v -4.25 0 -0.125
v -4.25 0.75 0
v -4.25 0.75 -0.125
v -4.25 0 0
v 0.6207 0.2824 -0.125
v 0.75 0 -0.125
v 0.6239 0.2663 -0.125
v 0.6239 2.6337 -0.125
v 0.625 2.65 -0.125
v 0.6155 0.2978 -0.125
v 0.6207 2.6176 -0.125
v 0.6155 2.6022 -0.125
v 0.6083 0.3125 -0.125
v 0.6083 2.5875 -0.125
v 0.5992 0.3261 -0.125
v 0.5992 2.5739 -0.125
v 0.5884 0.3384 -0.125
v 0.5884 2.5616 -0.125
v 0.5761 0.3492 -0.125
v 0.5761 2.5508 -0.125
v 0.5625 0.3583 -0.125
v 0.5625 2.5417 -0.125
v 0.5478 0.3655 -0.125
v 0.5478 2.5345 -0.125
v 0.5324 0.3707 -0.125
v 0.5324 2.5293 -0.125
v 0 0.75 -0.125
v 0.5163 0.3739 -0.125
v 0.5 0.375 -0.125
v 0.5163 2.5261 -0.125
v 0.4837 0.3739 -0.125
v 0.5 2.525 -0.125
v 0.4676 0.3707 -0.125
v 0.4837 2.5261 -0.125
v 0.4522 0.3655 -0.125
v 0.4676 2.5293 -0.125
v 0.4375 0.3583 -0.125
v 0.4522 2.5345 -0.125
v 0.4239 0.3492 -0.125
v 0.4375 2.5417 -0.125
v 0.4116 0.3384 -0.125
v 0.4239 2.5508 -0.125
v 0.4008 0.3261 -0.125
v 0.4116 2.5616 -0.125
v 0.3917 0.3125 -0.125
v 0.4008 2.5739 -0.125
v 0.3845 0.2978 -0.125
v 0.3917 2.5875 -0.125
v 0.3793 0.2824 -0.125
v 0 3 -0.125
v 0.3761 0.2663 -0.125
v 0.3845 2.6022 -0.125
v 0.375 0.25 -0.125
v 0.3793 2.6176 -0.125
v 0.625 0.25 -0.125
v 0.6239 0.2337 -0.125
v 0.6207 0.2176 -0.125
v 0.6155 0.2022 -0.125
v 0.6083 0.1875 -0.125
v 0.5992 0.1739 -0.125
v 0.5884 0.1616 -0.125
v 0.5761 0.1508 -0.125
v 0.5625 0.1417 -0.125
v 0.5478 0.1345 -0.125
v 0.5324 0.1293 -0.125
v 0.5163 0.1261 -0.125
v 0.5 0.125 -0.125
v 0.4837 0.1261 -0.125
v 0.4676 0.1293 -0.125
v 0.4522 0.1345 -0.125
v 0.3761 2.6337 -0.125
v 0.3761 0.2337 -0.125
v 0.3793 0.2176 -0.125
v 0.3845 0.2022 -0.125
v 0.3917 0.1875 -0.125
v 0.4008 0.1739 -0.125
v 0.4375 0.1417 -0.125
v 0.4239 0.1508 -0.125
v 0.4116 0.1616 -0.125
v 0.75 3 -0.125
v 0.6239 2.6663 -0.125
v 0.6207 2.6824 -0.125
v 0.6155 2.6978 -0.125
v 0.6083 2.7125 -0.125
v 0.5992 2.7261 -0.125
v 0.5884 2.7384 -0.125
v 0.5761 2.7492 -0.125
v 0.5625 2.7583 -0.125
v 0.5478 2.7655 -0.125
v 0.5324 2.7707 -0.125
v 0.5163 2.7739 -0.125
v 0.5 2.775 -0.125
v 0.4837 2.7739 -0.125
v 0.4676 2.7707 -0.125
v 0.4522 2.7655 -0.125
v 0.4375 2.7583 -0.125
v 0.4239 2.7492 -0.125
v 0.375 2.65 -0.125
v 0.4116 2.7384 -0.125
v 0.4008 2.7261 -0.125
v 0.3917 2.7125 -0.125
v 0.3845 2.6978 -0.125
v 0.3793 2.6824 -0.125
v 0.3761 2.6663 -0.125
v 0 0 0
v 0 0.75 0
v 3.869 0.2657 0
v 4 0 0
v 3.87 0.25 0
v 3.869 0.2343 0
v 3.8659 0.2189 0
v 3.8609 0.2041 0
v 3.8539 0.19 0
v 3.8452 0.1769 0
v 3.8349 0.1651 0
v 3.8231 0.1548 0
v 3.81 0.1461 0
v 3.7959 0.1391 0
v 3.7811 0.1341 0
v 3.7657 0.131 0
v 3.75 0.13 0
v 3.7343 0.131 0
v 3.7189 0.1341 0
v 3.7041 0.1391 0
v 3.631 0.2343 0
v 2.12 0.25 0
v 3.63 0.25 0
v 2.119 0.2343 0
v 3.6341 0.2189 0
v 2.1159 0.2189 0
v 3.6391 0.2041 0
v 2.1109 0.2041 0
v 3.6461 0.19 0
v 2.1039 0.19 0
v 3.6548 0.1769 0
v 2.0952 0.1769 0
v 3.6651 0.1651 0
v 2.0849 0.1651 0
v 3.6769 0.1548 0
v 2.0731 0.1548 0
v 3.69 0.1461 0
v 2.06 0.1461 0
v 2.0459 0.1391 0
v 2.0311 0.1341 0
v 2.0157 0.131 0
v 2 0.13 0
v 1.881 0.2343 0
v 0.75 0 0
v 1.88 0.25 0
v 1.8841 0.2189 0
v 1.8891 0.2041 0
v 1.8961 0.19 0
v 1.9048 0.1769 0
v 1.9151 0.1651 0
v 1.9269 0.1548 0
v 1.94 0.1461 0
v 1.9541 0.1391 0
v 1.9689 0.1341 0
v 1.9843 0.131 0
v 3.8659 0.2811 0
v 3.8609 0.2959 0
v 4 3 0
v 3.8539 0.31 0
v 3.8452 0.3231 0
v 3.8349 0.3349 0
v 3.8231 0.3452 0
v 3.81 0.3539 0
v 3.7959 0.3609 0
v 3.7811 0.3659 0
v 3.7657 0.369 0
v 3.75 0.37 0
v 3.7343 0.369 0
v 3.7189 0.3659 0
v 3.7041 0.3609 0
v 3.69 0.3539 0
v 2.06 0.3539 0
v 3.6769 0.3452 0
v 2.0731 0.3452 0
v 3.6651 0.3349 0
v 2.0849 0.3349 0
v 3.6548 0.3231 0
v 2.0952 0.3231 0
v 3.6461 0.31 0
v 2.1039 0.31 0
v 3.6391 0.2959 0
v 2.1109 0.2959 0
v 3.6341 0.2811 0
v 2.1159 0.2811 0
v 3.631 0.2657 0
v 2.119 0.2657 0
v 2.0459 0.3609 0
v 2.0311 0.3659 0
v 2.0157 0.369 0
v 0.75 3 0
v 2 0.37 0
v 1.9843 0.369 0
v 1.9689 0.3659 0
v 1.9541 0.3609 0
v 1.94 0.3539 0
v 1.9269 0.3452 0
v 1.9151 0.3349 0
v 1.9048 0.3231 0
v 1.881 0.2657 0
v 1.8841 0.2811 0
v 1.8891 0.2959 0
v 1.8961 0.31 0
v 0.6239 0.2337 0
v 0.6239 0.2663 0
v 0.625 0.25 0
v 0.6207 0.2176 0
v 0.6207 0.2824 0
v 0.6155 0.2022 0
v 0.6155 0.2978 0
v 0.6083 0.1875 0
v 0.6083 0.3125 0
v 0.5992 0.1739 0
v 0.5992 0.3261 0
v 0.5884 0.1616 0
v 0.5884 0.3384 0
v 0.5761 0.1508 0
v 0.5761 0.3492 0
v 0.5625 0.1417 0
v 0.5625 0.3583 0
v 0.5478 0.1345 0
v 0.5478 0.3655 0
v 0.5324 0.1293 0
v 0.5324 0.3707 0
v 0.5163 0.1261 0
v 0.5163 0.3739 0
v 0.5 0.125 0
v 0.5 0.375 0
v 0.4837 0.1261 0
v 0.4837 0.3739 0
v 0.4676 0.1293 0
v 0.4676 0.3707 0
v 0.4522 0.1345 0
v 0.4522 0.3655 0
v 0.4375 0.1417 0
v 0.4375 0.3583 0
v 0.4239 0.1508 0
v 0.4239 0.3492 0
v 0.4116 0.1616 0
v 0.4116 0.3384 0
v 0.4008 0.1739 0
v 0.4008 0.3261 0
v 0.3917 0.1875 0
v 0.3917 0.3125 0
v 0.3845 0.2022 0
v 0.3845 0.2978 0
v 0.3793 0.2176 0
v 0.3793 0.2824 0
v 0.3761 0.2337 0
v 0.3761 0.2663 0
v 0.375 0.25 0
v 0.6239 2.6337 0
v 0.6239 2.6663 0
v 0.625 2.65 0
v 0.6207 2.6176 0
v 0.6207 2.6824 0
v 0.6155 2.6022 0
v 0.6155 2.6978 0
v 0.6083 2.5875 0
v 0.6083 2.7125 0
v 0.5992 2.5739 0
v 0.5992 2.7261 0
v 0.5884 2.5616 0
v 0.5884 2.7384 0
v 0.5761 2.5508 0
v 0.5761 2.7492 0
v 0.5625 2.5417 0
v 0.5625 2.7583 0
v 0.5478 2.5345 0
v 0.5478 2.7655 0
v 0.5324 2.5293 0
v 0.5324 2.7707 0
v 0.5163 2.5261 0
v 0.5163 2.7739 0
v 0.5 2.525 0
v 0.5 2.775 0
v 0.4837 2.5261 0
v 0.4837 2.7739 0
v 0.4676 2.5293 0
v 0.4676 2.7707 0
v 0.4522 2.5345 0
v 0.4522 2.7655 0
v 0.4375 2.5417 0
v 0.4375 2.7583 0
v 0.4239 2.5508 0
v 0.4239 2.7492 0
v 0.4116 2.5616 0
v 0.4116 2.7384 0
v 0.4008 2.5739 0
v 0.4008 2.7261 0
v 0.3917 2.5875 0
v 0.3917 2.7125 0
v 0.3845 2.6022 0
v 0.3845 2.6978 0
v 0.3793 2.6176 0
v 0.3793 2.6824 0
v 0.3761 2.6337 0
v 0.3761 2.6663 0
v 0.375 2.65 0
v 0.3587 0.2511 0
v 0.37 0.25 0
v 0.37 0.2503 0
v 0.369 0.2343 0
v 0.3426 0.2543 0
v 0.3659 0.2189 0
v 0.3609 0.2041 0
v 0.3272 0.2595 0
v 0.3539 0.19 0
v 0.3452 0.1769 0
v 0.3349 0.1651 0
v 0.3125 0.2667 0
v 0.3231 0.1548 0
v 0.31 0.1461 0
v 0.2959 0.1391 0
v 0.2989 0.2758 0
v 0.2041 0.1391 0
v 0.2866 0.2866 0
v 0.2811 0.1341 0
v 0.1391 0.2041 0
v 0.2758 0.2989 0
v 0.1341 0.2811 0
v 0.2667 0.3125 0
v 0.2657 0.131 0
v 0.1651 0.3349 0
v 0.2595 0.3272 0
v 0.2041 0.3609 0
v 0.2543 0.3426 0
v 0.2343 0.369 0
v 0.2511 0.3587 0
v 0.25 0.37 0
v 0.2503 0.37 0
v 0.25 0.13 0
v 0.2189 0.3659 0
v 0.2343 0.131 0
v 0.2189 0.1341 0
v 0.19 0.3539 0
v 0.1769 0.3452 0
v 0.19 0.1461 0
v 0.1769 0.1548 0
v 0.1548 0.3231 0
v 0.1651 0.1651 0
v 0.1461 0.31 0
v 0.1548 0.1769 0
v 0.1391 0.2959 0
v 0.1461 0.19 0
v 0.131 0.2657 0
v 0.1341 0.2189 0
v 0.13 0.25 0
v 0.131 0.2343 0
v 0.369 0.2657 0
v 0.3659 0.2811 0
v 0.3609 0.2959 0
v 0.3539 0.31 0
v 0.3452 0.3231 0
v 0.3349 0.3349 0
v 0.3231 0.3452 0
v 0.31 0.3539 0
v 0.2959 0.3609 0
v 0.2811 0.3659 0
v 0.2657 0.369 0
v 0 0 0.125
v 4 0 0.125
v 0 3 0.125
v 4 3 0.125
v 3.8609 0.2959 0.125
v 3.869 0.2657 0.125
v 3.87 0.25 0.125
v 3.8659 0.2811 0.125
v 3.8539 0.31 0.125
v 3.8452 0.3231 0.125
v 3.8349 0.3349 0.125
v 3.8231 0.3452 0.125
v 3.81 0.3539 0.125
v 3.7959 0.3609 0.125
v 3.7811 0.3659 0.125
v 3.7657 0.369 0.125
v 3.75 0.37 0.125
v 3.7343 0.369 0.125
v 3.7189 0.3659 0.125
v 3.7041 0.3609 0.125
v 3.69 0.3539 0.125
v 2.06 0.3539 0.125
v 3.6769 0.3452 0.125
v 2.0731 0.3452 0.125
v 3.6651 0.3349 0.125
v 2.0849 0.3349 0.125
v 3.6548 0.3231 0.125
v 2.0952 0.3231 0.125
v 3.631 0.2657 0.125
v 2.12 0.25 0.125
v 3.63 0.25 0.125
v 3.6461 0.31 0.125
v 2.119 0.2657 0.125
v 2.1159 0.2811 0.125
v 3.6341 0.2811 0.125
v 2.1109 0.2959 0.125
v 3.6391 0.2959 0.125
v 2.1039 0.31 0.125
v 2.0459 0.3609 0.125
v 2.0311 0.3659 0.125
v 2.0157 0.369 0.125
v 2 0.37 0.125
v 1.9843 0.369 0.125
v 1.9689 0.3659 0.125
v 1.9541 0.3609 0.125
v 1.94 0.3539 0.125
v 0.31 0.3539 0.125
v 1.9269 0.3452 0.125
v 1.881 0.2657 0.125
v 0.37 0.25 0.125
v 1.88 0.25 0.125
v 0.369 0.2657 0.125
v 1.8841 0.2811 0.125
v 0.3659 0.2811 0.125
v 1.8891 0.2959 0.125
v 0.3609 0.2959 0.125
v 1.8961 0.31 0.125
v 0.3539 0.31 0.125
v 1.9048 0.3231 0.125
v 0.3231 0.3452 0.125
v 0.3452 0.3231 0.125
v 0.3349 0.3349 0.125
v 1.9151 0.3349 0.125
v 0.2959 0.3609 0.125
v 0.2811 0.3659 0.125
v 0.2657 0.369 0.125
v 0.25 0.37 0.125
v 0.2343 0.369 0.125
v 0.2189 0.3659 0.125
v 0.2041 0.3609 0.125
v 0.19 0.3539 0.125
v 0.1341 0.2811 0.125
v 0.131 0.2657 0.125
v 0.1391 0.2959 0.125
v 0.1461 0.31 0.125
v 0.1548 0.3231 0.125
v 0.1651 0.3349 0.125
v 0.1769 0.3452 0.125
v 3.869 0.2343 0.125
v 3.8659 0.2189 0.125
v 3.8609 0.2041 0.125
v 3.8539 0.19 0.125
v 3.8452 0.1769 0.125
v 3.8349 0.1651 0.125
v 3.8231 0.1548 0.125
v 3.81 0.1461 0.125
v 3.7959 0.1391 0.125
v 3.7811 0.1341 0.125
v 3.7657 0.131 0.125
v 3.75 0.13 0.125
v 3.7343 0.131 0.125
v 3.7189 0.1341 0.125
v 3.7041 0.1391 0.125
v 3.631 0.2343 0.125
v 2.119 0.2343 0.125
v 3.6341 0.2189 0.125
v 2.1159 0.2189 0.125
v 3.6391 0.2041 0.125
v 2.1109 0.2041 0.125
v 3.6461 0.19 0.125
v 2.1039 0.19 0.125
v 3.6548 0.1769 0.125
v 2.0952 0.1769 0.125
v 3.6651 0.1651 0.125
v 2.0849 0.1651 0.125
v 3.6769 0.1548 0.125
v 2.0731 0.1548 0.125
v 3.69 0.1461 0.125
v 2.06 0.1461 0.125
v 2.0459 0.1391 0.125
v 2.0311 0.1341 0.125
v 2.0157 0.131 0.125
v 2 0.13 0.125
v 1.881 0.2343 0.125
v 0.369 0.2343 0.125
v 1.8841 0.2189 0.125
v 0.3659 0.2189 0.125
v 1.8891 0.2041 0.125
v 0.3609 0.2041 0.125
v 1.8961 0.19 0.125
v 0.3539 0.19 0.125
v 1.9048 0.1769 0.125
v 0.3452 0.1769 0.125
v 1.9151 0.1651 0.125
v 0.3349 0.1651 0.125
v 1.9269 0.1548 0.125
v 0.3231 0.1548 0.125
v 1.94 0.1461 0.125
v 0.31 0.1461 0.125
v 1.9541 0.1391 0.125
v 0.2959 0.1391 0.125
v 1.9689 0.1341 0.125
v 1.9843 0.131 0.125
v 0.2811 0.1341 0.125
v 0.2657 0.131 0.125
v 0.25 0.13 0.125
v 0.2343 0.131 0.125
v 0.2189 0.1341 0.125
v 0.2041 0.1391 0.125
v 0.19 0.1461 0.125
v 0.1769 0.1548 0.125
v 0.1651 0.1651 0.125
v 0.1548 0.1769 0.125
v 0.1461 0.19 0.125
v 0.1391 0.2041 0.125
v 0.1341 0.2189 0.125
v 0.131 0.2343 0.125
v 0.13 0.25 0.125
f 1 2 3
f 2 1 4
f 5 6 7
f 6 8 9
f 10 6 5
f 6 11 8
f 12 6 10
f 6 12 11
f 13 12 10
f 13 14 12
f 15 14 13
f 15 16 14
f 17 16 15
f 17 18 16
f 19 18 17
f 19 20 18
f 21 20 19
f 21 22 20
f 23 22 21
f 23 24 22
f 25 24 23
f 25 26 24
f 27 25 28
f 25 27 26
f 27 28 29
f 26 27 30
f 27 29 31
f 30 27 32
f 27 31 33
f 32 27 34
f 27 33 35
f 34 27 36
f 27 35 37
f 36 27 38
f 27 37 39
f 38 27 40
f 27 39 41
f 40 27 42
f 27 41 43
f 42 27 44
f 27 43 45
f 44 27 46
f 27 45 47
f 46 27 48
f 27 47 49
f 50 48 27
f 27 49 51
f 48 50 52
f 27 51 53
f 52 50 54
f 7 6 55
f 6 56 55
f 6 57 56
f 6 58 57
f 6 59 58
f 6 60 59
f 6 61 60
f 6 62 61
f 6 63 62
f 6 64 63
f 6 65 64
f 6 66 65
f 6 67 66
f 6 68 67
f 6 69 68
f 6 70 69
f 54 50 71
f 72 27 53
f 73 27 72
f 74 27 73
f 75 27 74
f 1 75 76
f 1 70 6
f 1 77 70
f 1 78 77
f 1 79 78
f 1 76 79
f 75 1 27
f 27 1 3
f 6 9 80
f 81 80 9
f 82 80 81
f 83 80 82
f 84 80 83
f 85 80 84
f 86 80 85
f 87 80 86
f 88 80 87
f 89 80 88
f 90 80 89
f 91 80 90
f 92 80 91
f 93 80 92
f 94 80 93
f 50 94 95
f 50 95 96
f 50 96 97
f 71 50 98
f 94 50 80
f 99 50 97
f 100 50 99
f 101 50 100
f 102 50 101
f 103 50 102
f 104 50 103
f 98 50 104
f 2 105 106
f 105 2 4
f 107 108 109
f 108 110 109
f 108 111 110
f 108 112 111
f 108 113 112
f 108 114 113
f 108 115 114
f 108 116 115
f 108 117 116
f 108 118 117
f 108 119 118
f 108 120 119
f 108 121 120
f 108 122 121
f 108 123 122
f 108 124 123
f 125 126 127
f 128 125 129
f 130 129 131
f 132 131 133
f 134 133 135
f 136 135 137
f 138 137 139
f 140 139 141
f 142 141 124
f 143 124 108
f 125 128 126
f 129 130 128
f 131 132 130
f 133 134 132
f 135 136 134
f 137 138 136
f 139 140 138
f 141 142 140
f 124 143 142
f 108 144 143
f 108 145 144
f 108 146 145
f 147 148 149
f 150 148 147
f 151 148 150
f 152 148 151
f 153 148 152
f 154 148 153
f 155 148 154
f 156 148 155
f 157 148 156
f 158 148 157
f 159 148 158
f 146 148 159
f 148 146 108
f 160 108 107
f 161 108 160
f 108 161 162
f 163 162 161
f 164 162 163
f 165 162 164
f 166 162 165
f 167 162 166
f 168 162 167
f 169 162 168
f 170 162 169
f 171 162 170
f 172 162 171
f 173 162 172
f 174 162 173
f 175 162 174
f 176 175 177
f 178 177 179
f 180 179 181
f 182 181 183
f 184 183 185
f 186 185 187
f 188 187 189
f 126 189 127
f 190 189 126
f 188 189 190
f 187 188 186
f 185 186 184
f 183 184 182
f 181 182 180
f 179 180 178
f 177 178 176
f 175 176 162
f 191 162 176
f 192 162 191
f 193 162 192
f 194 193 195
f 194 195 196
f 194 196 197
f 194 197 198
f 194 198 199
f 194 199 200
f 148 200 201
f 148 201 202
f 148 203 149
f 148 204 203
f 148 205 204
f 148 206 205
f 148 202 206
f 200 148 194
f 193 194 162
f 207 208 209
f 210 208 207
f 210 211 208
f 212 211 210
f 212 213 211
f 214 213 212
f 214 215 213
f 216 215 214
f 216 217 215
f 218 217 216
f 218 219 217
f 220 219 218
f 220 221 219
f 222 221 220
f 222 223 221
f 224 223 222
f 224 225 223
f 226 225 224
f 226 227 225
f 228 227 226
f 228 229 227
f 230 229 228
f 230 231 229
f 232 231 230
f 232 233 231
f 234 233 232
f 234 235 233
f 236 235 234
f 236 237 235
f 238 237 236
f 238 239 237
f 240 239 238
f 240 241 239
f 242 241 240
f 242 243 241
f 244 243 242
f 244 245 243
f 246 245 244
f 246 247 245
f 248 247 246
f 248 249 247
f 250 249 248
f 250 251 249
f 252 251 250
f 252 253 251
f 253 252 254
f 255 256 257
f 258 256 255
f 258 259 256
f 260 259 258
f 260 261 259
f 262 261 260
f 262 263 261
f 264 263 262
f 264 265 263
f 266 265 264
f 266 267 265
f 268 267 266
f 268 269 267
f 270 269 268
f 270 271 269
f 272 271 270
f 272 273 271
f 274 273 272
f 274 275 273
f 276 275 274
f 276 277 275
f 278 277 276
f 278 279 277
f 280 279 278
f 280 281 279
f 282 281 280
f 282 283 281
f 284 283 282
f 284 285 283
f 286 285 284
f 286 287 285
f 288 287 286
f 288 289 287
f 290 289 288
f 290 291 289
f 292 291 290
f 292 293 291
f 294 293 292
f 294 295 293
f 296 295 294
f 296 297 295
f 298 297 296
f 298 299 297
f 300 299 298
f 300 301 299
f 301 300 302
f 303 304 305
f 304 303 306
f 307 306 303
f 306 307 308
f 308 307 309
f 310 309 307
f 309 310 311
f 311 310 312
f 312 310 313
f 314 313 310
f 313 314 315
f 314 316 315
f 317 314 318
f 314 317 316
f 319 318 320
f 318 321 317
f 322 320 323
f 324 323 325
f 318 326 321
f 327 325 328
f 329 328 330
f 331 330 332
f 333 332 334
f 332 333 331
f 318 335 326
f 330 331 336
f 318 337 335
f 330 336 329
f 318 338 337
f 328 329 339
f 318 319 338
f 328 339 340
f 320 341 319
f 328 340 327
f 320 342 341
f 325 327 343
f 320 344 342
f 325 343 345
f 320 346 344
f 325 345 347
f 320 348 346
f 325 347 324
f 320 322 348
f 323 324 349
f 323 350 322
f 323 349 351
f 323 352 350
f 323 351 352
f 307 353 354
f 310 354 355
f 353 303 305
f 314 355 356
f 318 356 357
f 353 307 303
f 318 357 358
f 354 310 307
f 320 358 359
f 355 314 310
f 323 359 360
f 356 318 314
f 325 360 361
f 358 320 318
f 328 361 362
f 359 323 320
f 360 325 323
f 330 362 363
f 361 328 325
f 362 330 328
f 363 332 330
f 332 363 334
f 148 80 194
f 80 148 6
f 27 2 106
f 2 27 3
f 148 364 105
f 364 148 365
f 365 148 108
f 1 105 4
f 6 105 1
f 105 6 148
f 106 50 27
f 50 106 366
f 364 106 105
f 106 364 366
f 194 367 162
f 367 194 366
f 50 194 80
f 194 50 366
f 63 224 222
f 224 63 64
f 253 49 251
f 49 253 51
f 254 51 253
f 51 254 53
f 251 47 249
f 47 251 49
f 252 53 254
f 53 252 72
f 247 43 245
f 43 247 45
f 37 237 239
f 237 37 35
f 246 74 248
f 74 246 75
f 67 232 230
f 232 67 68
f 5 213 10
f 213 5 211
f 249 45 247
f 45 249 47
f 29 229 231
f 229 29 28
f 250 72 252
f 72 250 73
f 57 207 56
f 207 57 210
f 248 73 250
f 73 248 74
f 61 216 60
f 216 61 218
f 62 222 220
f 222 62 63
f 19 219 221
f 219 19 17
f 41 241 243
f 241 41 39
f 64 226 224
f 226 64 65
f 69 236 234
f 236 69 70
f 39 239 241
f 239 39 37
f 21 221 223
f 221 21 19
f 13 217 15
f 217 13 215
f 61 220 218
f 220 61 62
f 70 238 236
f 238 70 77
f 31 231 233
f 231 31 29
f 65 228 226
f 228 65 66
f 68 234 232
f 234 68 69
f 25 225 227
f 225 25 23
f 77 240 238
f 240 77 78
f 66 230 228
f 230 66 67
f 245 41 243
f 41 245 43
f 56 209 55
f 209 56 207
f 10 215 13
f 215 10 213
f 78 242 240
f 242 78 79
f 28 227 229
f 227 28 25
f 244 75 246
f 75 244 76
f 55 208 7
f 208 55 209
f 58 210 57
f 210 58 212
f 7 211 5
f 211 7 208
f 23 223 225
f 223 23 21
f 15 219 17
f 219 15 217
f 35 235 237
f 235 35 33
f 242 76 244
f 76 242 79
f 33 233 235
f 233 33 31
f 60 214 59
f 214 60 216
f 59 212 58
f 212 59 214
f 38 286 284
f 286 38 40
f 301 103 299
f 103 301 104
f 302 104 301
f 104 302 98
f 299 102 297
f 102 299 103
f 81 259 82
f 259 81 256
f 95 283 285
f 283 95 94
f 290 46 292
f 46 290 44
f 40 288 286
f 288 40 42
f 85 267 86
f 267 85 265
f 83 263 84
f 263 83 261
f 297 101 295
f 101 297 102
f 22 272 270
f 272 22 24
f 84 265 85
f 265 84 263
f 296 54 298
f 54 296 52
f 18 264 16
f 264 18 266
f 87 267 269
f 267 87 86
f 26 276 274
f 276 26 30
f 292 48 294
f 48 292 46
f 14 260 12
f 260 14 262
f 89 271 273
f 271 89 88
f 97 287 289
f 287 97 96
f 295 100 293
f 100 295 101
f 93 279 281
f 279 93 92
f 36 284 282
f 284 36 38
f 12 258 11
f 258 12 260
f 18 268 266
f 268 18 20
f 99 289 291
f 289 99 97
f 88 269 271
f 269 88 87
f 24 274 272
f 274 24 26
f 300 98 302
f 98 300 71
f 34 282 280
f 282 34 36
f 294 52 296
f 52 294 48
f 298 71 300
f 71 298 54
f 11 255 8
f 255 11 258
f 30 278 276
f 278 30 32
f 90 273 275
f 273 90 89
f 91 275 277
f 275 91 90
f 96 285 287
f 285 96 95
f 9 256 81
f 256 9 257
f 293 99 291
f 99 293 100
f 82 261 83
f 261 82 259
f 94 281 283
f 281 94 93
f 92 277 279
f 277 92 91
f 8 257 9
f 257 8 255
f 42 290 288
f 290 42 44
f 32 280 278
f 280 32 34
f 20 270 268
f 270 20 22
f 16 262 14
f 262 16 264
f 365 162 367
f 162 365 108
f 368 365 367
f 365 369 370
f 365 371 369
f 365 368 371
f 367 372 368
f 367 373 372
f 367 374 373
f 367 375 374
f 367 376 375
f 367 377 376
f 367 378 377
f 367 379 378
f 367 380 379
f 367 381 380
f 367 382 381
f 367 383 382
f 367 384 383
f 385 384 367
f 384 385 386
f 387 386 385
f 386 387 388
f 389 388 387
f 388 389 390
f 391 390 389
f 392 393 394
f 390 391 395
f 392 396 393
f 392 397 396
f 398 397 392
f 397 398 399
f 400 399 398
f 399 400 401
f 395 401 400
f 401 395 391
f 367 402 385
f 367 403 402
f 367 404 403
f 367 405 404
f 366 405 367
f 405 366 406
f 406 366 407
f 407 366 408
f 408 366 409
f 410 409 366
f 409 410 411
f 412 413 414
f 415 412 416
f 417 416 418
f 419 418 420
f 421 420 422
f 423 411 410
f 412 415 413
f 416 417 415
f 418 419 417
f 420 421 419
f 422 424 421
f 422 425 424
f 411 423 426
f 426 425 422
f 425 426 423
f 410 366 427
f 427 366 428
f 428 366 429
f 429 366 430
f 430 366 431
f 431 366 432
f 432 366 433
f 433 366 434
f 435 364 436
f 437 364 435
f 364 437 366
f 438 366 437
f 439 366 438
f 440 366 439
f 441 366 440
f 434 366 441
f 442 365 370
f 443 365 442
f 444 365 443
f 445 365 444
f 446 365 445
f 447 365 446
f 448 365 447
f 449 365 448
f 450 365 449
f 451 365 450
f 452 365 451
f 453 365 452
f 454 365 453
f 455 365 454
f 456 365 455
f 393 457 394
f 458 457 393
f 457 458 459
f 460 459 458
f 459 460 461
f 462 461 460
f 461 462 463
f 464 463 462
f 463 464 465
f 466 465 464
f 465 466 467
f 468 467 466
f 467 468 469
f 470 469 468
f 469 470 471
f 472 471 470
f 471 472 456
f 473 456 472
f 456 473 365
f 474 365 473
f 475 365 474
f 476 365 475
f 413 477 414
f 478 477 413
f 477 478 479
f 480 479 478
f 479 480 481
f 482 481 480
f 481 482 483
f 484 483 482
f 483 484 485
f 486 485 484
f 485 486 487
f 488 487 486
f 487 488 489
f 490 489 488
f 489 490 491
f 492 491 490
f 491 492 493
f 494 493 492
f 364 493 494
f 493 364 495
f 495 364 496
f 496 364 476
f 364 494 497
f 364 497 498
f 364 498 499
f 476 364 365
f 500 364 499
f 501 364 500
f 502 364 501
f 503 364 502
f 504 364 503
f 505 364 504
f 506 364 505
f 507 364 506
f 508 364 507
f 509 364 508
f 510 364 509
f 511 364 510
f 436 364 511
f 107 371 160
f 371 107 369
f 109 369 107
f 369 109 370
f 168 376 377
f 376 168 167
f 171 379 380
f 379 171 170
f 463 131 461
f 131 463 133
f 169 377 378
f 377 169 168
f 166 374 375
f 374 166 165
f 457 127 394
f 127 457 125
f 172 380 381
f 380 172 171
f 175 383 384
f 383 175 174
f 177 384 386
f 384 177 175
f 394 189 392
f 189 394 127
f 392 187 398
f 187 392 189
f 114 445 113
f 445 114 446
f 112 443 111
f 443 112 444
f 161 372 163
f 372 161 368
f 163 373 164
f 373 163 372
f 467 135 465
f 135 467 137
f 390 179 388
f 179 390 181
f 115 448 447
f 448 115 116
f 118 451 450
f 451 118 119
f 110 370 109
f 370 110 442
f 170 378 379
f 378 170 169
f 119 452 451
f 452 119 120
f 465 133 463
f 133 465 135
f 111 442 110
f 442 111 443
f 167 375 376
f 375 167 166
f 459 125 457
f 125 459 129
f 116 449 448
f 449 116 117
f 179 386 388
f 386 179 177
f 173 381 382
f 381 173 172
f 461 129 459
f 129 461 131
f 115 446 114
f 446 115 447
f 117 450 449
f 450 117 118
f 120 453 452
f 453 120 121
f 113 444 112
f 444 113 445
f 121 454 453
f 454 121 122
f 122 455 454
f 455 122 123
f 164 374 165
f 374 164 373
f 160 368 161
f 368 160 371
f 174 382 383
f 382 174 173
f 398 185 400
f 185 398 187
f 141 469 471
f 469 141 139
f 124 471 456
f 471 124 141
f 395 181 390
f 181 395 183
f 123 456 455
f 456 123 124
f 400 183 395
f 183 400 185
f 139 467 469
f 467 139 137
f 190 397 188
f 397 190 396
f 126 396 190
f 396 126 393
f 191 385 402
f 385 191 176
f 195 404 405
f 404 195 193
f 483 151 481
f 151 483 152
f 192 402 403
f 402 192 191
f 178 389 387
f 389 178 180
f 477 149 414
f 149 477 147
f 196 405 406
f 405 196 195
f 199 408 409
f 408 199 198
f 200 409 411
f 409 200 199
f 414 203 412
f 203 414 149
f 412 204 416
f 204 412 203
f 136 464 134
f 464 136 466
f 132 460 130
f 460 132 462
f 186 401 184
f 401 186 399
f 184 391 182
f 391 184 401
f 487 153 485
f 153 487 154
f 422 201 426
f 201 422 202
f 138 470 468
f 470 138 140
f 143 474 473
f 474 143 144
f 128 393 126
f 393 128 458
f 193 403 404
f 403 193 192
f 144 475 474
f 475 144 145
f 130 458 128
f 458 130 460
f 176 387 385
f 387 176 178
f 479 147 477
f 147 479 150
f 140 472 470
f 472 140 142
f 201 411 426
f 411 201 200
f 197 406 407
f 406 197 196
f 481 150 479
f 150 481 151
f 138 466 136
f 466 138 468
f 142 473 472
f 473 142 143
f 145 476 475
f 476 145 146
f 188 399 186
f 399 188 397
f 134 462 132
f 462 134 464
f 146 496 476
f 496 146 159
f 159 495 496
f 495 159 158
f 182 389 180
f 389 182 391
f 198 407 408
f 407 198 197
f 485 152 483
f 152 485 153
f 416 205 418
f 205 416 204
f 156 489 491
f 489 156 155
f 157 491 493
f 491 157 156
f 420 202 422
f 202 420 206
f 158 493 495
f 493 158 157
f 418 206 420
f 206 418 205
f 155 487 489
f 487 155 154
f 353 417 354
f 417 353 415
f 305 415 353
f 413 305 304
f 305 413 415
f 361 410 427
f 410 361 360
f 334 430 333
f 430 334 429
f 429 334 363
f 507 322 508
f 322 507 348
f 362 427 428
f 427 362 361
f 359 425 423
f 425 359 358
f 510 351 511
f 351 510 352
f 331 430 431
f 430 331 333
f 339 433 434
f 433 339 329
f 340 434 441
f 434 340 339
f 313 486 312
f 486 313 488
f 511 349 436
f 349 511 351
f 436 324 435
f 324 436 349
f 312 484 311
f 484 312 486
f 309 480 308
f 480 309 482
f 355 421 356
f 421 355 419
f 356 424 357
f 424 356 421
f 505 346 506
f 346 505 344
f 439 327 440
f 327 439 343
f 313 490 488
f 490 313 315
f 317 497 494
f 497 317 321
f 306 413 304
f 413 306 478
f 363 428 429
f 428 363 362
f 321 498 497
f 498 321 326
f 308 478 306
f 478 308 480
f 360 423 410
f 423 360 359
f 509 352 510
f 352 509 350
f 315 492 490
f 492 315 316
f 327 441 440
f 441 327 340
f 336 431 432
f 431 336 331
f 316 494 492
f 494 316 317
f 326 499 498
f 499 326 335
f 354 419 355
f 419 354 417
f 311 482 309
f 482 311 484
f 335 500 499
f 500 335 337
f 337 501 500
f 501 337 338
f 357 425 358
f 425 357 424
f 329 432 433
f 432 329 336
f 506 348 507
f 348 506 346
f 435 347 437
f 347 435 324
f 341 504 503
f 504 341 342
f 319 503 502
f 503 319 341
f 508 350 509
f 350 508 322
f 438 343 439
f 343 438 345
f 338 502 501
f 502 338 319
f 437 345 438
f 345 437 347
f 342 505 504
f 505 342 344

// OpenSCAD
$fn = 48;
arc_radius=3;
union() {
	union() {
		difference() {
			rotate(a = [0, 180, 0]) {
				difference() {
                    color("blue") {
                        translate([-.75,0,0]) {
                            union() {
                                cube(size = [5, 0.7500000000, 0.1250000000]);
                                cube(size = [0.7500000000, 3, 0.1250000000]);
                            }
                        }
                    }
                    // holes
					translate(v = [-0.500000000, 0.2500000000, 0]) {
						cylinder(h = 0.1250000000, r = 0.1250000000);
					}
					translate(v = [-0.500000000, 2.6500000000, 0]) {
						cylinder(h = 0.1250000000, r = 0.1250000000);
					}
				}
			}
			translate(v = [0.3750000000, 0.3750000000, 0]) {
				cylinder(h = 0.1250000000, r = 0.1250000000);
			}
			translate(v = [0.3750000000, 2.6250000000, 0]) {
				cylinder(h = 0.1250000000, r = 0.1250000000);
			}
			translate(v = [5.6255000000, 0.3750000000, 0]) {
				cylinder(h = 0.1250000000, r = 0.1250000000);
			}
		}
        //the arc
		difference() {
			cube(size = [4, 3, 0.1250000000]);
			translate(v = [3.7500000000, 0.2500000000]) {
				cylinder(h = 0.2500000000, r = 0.1200000000);
			}
			translate(v = [2, 0.2500000000]) {
				cylinder(h = 0.2500000000, r = 0.1200000000);
			}
			translate(v = [0.2500000000, 0.2500000000]) {
				cylinder(h = 0.2500000000, r = 0.1200000000);
			}
			difference() {
				difference() {
					circle(r = 2.7500000000);
					rotate(a = 5) {
						translate(v = [0, -2.7500000000, 0]) {
							square(center = true, size = [8.2500000000, 5.5000000000]);
						}
					}
					rotate(a = -95) {
						translate(v = [0, -2.7500000000, 0]) {
							square(center = true, size = [8.2500000000, 5.5000000000]);
						}
					}
				}
				difference() {
					circle(r = 2.6250000000);
					rotate(a = 5) {
						translate(v = [0, -2.6250000000, 0]) {
							square(center = true, size = [7.8750000000, 5.2500000000]);
						}
					}
					rotate(a = -95) {
						translate(v = [0, -2.6250000000, 0]) {
							square(center = true, size = [7.8750000000, 5.2500000000]);
						}
					}
				}
			}
		}
	}
}
/***********************************************
*********      SolidPython code:      **********
************************************************
 
#! /usr/bin/env python
# -*- coding: UTF-8 -*-
from __future__ import division
import os
import sys
import re

# Assumes SolidPython is in site-packages or elsewhwere in sys.path
from solid import *
from solid.utils import *

SEGMENTS = 48

eccentric_plate_x = 3;
eccentric_plate_y = 3;
eccentric_plate_z = 0.125;

rad=2.75;
s=5;
e=85;

def bell_crank():
    a = difference() (
        rotate( [0,180,0] ) (
          difference()(
            union() (
                cube([5,.75,.125]),
                cube([.75,2,.125]),
            ),
            translate([0.25,.25,0]) (cylinder(r=.125,h=.125)),
            translate([0.25,1.25,0]) (cylinder(r=.125,h=.125)),
          ),
        ),
        translate([0.375,.375,0]) (cylinder(r=.125,h=.125)),
        translate([0.375,2.625,0])( cylinder(r=.125,h=.125)),
        translate([5.6255,.375,0])( cylinder(r=.125,h=.125)),
    )
    return a

def curved_link():
    a = union()(
            bell_crank(),
            difference () (
            cube( [4,3, 0.125]),
            
        
            translate( [3.75, .25] )( cylinder(r=0.12, h=.25)),
            translate( [2, .25] ) (cylinder(r=0.12, h=.25)),
            translate( [.25, .25] ) (cylinder(r=0.12, h=.25)), 
            # height, depth, radius, degrees
            #if (version==1)  slot(),
            #if (version==2)  slot_rainbow(),
            difference()(
                arc(rad=rad, start_degrees=s, end_degrees=e),
                arc(rad=rad-.125, start_degrees=s, end_degrees=e),
            )
        )
    )
    return a


def assembly():
    # Your code here!
    a = union() (
        curved_link(),
    )
    return a

if __name__ == '__main__':
    a = assembly()
    out_dir = sys.argv[1] if len(sys.argv) > 1 else os.curdir
    file_out = os.path.join(out_dir, sys.argv[0])
    scad_render_to_file(a, file_header='$fn = %s;' % SEGMENTS, include_orig_code=True)


    print("%(__file__)s: SCAD file written to: \n%(file_out)s" % vars())
    bom = bill_of_materials()
    print(bom)



 
 
************************************************/
